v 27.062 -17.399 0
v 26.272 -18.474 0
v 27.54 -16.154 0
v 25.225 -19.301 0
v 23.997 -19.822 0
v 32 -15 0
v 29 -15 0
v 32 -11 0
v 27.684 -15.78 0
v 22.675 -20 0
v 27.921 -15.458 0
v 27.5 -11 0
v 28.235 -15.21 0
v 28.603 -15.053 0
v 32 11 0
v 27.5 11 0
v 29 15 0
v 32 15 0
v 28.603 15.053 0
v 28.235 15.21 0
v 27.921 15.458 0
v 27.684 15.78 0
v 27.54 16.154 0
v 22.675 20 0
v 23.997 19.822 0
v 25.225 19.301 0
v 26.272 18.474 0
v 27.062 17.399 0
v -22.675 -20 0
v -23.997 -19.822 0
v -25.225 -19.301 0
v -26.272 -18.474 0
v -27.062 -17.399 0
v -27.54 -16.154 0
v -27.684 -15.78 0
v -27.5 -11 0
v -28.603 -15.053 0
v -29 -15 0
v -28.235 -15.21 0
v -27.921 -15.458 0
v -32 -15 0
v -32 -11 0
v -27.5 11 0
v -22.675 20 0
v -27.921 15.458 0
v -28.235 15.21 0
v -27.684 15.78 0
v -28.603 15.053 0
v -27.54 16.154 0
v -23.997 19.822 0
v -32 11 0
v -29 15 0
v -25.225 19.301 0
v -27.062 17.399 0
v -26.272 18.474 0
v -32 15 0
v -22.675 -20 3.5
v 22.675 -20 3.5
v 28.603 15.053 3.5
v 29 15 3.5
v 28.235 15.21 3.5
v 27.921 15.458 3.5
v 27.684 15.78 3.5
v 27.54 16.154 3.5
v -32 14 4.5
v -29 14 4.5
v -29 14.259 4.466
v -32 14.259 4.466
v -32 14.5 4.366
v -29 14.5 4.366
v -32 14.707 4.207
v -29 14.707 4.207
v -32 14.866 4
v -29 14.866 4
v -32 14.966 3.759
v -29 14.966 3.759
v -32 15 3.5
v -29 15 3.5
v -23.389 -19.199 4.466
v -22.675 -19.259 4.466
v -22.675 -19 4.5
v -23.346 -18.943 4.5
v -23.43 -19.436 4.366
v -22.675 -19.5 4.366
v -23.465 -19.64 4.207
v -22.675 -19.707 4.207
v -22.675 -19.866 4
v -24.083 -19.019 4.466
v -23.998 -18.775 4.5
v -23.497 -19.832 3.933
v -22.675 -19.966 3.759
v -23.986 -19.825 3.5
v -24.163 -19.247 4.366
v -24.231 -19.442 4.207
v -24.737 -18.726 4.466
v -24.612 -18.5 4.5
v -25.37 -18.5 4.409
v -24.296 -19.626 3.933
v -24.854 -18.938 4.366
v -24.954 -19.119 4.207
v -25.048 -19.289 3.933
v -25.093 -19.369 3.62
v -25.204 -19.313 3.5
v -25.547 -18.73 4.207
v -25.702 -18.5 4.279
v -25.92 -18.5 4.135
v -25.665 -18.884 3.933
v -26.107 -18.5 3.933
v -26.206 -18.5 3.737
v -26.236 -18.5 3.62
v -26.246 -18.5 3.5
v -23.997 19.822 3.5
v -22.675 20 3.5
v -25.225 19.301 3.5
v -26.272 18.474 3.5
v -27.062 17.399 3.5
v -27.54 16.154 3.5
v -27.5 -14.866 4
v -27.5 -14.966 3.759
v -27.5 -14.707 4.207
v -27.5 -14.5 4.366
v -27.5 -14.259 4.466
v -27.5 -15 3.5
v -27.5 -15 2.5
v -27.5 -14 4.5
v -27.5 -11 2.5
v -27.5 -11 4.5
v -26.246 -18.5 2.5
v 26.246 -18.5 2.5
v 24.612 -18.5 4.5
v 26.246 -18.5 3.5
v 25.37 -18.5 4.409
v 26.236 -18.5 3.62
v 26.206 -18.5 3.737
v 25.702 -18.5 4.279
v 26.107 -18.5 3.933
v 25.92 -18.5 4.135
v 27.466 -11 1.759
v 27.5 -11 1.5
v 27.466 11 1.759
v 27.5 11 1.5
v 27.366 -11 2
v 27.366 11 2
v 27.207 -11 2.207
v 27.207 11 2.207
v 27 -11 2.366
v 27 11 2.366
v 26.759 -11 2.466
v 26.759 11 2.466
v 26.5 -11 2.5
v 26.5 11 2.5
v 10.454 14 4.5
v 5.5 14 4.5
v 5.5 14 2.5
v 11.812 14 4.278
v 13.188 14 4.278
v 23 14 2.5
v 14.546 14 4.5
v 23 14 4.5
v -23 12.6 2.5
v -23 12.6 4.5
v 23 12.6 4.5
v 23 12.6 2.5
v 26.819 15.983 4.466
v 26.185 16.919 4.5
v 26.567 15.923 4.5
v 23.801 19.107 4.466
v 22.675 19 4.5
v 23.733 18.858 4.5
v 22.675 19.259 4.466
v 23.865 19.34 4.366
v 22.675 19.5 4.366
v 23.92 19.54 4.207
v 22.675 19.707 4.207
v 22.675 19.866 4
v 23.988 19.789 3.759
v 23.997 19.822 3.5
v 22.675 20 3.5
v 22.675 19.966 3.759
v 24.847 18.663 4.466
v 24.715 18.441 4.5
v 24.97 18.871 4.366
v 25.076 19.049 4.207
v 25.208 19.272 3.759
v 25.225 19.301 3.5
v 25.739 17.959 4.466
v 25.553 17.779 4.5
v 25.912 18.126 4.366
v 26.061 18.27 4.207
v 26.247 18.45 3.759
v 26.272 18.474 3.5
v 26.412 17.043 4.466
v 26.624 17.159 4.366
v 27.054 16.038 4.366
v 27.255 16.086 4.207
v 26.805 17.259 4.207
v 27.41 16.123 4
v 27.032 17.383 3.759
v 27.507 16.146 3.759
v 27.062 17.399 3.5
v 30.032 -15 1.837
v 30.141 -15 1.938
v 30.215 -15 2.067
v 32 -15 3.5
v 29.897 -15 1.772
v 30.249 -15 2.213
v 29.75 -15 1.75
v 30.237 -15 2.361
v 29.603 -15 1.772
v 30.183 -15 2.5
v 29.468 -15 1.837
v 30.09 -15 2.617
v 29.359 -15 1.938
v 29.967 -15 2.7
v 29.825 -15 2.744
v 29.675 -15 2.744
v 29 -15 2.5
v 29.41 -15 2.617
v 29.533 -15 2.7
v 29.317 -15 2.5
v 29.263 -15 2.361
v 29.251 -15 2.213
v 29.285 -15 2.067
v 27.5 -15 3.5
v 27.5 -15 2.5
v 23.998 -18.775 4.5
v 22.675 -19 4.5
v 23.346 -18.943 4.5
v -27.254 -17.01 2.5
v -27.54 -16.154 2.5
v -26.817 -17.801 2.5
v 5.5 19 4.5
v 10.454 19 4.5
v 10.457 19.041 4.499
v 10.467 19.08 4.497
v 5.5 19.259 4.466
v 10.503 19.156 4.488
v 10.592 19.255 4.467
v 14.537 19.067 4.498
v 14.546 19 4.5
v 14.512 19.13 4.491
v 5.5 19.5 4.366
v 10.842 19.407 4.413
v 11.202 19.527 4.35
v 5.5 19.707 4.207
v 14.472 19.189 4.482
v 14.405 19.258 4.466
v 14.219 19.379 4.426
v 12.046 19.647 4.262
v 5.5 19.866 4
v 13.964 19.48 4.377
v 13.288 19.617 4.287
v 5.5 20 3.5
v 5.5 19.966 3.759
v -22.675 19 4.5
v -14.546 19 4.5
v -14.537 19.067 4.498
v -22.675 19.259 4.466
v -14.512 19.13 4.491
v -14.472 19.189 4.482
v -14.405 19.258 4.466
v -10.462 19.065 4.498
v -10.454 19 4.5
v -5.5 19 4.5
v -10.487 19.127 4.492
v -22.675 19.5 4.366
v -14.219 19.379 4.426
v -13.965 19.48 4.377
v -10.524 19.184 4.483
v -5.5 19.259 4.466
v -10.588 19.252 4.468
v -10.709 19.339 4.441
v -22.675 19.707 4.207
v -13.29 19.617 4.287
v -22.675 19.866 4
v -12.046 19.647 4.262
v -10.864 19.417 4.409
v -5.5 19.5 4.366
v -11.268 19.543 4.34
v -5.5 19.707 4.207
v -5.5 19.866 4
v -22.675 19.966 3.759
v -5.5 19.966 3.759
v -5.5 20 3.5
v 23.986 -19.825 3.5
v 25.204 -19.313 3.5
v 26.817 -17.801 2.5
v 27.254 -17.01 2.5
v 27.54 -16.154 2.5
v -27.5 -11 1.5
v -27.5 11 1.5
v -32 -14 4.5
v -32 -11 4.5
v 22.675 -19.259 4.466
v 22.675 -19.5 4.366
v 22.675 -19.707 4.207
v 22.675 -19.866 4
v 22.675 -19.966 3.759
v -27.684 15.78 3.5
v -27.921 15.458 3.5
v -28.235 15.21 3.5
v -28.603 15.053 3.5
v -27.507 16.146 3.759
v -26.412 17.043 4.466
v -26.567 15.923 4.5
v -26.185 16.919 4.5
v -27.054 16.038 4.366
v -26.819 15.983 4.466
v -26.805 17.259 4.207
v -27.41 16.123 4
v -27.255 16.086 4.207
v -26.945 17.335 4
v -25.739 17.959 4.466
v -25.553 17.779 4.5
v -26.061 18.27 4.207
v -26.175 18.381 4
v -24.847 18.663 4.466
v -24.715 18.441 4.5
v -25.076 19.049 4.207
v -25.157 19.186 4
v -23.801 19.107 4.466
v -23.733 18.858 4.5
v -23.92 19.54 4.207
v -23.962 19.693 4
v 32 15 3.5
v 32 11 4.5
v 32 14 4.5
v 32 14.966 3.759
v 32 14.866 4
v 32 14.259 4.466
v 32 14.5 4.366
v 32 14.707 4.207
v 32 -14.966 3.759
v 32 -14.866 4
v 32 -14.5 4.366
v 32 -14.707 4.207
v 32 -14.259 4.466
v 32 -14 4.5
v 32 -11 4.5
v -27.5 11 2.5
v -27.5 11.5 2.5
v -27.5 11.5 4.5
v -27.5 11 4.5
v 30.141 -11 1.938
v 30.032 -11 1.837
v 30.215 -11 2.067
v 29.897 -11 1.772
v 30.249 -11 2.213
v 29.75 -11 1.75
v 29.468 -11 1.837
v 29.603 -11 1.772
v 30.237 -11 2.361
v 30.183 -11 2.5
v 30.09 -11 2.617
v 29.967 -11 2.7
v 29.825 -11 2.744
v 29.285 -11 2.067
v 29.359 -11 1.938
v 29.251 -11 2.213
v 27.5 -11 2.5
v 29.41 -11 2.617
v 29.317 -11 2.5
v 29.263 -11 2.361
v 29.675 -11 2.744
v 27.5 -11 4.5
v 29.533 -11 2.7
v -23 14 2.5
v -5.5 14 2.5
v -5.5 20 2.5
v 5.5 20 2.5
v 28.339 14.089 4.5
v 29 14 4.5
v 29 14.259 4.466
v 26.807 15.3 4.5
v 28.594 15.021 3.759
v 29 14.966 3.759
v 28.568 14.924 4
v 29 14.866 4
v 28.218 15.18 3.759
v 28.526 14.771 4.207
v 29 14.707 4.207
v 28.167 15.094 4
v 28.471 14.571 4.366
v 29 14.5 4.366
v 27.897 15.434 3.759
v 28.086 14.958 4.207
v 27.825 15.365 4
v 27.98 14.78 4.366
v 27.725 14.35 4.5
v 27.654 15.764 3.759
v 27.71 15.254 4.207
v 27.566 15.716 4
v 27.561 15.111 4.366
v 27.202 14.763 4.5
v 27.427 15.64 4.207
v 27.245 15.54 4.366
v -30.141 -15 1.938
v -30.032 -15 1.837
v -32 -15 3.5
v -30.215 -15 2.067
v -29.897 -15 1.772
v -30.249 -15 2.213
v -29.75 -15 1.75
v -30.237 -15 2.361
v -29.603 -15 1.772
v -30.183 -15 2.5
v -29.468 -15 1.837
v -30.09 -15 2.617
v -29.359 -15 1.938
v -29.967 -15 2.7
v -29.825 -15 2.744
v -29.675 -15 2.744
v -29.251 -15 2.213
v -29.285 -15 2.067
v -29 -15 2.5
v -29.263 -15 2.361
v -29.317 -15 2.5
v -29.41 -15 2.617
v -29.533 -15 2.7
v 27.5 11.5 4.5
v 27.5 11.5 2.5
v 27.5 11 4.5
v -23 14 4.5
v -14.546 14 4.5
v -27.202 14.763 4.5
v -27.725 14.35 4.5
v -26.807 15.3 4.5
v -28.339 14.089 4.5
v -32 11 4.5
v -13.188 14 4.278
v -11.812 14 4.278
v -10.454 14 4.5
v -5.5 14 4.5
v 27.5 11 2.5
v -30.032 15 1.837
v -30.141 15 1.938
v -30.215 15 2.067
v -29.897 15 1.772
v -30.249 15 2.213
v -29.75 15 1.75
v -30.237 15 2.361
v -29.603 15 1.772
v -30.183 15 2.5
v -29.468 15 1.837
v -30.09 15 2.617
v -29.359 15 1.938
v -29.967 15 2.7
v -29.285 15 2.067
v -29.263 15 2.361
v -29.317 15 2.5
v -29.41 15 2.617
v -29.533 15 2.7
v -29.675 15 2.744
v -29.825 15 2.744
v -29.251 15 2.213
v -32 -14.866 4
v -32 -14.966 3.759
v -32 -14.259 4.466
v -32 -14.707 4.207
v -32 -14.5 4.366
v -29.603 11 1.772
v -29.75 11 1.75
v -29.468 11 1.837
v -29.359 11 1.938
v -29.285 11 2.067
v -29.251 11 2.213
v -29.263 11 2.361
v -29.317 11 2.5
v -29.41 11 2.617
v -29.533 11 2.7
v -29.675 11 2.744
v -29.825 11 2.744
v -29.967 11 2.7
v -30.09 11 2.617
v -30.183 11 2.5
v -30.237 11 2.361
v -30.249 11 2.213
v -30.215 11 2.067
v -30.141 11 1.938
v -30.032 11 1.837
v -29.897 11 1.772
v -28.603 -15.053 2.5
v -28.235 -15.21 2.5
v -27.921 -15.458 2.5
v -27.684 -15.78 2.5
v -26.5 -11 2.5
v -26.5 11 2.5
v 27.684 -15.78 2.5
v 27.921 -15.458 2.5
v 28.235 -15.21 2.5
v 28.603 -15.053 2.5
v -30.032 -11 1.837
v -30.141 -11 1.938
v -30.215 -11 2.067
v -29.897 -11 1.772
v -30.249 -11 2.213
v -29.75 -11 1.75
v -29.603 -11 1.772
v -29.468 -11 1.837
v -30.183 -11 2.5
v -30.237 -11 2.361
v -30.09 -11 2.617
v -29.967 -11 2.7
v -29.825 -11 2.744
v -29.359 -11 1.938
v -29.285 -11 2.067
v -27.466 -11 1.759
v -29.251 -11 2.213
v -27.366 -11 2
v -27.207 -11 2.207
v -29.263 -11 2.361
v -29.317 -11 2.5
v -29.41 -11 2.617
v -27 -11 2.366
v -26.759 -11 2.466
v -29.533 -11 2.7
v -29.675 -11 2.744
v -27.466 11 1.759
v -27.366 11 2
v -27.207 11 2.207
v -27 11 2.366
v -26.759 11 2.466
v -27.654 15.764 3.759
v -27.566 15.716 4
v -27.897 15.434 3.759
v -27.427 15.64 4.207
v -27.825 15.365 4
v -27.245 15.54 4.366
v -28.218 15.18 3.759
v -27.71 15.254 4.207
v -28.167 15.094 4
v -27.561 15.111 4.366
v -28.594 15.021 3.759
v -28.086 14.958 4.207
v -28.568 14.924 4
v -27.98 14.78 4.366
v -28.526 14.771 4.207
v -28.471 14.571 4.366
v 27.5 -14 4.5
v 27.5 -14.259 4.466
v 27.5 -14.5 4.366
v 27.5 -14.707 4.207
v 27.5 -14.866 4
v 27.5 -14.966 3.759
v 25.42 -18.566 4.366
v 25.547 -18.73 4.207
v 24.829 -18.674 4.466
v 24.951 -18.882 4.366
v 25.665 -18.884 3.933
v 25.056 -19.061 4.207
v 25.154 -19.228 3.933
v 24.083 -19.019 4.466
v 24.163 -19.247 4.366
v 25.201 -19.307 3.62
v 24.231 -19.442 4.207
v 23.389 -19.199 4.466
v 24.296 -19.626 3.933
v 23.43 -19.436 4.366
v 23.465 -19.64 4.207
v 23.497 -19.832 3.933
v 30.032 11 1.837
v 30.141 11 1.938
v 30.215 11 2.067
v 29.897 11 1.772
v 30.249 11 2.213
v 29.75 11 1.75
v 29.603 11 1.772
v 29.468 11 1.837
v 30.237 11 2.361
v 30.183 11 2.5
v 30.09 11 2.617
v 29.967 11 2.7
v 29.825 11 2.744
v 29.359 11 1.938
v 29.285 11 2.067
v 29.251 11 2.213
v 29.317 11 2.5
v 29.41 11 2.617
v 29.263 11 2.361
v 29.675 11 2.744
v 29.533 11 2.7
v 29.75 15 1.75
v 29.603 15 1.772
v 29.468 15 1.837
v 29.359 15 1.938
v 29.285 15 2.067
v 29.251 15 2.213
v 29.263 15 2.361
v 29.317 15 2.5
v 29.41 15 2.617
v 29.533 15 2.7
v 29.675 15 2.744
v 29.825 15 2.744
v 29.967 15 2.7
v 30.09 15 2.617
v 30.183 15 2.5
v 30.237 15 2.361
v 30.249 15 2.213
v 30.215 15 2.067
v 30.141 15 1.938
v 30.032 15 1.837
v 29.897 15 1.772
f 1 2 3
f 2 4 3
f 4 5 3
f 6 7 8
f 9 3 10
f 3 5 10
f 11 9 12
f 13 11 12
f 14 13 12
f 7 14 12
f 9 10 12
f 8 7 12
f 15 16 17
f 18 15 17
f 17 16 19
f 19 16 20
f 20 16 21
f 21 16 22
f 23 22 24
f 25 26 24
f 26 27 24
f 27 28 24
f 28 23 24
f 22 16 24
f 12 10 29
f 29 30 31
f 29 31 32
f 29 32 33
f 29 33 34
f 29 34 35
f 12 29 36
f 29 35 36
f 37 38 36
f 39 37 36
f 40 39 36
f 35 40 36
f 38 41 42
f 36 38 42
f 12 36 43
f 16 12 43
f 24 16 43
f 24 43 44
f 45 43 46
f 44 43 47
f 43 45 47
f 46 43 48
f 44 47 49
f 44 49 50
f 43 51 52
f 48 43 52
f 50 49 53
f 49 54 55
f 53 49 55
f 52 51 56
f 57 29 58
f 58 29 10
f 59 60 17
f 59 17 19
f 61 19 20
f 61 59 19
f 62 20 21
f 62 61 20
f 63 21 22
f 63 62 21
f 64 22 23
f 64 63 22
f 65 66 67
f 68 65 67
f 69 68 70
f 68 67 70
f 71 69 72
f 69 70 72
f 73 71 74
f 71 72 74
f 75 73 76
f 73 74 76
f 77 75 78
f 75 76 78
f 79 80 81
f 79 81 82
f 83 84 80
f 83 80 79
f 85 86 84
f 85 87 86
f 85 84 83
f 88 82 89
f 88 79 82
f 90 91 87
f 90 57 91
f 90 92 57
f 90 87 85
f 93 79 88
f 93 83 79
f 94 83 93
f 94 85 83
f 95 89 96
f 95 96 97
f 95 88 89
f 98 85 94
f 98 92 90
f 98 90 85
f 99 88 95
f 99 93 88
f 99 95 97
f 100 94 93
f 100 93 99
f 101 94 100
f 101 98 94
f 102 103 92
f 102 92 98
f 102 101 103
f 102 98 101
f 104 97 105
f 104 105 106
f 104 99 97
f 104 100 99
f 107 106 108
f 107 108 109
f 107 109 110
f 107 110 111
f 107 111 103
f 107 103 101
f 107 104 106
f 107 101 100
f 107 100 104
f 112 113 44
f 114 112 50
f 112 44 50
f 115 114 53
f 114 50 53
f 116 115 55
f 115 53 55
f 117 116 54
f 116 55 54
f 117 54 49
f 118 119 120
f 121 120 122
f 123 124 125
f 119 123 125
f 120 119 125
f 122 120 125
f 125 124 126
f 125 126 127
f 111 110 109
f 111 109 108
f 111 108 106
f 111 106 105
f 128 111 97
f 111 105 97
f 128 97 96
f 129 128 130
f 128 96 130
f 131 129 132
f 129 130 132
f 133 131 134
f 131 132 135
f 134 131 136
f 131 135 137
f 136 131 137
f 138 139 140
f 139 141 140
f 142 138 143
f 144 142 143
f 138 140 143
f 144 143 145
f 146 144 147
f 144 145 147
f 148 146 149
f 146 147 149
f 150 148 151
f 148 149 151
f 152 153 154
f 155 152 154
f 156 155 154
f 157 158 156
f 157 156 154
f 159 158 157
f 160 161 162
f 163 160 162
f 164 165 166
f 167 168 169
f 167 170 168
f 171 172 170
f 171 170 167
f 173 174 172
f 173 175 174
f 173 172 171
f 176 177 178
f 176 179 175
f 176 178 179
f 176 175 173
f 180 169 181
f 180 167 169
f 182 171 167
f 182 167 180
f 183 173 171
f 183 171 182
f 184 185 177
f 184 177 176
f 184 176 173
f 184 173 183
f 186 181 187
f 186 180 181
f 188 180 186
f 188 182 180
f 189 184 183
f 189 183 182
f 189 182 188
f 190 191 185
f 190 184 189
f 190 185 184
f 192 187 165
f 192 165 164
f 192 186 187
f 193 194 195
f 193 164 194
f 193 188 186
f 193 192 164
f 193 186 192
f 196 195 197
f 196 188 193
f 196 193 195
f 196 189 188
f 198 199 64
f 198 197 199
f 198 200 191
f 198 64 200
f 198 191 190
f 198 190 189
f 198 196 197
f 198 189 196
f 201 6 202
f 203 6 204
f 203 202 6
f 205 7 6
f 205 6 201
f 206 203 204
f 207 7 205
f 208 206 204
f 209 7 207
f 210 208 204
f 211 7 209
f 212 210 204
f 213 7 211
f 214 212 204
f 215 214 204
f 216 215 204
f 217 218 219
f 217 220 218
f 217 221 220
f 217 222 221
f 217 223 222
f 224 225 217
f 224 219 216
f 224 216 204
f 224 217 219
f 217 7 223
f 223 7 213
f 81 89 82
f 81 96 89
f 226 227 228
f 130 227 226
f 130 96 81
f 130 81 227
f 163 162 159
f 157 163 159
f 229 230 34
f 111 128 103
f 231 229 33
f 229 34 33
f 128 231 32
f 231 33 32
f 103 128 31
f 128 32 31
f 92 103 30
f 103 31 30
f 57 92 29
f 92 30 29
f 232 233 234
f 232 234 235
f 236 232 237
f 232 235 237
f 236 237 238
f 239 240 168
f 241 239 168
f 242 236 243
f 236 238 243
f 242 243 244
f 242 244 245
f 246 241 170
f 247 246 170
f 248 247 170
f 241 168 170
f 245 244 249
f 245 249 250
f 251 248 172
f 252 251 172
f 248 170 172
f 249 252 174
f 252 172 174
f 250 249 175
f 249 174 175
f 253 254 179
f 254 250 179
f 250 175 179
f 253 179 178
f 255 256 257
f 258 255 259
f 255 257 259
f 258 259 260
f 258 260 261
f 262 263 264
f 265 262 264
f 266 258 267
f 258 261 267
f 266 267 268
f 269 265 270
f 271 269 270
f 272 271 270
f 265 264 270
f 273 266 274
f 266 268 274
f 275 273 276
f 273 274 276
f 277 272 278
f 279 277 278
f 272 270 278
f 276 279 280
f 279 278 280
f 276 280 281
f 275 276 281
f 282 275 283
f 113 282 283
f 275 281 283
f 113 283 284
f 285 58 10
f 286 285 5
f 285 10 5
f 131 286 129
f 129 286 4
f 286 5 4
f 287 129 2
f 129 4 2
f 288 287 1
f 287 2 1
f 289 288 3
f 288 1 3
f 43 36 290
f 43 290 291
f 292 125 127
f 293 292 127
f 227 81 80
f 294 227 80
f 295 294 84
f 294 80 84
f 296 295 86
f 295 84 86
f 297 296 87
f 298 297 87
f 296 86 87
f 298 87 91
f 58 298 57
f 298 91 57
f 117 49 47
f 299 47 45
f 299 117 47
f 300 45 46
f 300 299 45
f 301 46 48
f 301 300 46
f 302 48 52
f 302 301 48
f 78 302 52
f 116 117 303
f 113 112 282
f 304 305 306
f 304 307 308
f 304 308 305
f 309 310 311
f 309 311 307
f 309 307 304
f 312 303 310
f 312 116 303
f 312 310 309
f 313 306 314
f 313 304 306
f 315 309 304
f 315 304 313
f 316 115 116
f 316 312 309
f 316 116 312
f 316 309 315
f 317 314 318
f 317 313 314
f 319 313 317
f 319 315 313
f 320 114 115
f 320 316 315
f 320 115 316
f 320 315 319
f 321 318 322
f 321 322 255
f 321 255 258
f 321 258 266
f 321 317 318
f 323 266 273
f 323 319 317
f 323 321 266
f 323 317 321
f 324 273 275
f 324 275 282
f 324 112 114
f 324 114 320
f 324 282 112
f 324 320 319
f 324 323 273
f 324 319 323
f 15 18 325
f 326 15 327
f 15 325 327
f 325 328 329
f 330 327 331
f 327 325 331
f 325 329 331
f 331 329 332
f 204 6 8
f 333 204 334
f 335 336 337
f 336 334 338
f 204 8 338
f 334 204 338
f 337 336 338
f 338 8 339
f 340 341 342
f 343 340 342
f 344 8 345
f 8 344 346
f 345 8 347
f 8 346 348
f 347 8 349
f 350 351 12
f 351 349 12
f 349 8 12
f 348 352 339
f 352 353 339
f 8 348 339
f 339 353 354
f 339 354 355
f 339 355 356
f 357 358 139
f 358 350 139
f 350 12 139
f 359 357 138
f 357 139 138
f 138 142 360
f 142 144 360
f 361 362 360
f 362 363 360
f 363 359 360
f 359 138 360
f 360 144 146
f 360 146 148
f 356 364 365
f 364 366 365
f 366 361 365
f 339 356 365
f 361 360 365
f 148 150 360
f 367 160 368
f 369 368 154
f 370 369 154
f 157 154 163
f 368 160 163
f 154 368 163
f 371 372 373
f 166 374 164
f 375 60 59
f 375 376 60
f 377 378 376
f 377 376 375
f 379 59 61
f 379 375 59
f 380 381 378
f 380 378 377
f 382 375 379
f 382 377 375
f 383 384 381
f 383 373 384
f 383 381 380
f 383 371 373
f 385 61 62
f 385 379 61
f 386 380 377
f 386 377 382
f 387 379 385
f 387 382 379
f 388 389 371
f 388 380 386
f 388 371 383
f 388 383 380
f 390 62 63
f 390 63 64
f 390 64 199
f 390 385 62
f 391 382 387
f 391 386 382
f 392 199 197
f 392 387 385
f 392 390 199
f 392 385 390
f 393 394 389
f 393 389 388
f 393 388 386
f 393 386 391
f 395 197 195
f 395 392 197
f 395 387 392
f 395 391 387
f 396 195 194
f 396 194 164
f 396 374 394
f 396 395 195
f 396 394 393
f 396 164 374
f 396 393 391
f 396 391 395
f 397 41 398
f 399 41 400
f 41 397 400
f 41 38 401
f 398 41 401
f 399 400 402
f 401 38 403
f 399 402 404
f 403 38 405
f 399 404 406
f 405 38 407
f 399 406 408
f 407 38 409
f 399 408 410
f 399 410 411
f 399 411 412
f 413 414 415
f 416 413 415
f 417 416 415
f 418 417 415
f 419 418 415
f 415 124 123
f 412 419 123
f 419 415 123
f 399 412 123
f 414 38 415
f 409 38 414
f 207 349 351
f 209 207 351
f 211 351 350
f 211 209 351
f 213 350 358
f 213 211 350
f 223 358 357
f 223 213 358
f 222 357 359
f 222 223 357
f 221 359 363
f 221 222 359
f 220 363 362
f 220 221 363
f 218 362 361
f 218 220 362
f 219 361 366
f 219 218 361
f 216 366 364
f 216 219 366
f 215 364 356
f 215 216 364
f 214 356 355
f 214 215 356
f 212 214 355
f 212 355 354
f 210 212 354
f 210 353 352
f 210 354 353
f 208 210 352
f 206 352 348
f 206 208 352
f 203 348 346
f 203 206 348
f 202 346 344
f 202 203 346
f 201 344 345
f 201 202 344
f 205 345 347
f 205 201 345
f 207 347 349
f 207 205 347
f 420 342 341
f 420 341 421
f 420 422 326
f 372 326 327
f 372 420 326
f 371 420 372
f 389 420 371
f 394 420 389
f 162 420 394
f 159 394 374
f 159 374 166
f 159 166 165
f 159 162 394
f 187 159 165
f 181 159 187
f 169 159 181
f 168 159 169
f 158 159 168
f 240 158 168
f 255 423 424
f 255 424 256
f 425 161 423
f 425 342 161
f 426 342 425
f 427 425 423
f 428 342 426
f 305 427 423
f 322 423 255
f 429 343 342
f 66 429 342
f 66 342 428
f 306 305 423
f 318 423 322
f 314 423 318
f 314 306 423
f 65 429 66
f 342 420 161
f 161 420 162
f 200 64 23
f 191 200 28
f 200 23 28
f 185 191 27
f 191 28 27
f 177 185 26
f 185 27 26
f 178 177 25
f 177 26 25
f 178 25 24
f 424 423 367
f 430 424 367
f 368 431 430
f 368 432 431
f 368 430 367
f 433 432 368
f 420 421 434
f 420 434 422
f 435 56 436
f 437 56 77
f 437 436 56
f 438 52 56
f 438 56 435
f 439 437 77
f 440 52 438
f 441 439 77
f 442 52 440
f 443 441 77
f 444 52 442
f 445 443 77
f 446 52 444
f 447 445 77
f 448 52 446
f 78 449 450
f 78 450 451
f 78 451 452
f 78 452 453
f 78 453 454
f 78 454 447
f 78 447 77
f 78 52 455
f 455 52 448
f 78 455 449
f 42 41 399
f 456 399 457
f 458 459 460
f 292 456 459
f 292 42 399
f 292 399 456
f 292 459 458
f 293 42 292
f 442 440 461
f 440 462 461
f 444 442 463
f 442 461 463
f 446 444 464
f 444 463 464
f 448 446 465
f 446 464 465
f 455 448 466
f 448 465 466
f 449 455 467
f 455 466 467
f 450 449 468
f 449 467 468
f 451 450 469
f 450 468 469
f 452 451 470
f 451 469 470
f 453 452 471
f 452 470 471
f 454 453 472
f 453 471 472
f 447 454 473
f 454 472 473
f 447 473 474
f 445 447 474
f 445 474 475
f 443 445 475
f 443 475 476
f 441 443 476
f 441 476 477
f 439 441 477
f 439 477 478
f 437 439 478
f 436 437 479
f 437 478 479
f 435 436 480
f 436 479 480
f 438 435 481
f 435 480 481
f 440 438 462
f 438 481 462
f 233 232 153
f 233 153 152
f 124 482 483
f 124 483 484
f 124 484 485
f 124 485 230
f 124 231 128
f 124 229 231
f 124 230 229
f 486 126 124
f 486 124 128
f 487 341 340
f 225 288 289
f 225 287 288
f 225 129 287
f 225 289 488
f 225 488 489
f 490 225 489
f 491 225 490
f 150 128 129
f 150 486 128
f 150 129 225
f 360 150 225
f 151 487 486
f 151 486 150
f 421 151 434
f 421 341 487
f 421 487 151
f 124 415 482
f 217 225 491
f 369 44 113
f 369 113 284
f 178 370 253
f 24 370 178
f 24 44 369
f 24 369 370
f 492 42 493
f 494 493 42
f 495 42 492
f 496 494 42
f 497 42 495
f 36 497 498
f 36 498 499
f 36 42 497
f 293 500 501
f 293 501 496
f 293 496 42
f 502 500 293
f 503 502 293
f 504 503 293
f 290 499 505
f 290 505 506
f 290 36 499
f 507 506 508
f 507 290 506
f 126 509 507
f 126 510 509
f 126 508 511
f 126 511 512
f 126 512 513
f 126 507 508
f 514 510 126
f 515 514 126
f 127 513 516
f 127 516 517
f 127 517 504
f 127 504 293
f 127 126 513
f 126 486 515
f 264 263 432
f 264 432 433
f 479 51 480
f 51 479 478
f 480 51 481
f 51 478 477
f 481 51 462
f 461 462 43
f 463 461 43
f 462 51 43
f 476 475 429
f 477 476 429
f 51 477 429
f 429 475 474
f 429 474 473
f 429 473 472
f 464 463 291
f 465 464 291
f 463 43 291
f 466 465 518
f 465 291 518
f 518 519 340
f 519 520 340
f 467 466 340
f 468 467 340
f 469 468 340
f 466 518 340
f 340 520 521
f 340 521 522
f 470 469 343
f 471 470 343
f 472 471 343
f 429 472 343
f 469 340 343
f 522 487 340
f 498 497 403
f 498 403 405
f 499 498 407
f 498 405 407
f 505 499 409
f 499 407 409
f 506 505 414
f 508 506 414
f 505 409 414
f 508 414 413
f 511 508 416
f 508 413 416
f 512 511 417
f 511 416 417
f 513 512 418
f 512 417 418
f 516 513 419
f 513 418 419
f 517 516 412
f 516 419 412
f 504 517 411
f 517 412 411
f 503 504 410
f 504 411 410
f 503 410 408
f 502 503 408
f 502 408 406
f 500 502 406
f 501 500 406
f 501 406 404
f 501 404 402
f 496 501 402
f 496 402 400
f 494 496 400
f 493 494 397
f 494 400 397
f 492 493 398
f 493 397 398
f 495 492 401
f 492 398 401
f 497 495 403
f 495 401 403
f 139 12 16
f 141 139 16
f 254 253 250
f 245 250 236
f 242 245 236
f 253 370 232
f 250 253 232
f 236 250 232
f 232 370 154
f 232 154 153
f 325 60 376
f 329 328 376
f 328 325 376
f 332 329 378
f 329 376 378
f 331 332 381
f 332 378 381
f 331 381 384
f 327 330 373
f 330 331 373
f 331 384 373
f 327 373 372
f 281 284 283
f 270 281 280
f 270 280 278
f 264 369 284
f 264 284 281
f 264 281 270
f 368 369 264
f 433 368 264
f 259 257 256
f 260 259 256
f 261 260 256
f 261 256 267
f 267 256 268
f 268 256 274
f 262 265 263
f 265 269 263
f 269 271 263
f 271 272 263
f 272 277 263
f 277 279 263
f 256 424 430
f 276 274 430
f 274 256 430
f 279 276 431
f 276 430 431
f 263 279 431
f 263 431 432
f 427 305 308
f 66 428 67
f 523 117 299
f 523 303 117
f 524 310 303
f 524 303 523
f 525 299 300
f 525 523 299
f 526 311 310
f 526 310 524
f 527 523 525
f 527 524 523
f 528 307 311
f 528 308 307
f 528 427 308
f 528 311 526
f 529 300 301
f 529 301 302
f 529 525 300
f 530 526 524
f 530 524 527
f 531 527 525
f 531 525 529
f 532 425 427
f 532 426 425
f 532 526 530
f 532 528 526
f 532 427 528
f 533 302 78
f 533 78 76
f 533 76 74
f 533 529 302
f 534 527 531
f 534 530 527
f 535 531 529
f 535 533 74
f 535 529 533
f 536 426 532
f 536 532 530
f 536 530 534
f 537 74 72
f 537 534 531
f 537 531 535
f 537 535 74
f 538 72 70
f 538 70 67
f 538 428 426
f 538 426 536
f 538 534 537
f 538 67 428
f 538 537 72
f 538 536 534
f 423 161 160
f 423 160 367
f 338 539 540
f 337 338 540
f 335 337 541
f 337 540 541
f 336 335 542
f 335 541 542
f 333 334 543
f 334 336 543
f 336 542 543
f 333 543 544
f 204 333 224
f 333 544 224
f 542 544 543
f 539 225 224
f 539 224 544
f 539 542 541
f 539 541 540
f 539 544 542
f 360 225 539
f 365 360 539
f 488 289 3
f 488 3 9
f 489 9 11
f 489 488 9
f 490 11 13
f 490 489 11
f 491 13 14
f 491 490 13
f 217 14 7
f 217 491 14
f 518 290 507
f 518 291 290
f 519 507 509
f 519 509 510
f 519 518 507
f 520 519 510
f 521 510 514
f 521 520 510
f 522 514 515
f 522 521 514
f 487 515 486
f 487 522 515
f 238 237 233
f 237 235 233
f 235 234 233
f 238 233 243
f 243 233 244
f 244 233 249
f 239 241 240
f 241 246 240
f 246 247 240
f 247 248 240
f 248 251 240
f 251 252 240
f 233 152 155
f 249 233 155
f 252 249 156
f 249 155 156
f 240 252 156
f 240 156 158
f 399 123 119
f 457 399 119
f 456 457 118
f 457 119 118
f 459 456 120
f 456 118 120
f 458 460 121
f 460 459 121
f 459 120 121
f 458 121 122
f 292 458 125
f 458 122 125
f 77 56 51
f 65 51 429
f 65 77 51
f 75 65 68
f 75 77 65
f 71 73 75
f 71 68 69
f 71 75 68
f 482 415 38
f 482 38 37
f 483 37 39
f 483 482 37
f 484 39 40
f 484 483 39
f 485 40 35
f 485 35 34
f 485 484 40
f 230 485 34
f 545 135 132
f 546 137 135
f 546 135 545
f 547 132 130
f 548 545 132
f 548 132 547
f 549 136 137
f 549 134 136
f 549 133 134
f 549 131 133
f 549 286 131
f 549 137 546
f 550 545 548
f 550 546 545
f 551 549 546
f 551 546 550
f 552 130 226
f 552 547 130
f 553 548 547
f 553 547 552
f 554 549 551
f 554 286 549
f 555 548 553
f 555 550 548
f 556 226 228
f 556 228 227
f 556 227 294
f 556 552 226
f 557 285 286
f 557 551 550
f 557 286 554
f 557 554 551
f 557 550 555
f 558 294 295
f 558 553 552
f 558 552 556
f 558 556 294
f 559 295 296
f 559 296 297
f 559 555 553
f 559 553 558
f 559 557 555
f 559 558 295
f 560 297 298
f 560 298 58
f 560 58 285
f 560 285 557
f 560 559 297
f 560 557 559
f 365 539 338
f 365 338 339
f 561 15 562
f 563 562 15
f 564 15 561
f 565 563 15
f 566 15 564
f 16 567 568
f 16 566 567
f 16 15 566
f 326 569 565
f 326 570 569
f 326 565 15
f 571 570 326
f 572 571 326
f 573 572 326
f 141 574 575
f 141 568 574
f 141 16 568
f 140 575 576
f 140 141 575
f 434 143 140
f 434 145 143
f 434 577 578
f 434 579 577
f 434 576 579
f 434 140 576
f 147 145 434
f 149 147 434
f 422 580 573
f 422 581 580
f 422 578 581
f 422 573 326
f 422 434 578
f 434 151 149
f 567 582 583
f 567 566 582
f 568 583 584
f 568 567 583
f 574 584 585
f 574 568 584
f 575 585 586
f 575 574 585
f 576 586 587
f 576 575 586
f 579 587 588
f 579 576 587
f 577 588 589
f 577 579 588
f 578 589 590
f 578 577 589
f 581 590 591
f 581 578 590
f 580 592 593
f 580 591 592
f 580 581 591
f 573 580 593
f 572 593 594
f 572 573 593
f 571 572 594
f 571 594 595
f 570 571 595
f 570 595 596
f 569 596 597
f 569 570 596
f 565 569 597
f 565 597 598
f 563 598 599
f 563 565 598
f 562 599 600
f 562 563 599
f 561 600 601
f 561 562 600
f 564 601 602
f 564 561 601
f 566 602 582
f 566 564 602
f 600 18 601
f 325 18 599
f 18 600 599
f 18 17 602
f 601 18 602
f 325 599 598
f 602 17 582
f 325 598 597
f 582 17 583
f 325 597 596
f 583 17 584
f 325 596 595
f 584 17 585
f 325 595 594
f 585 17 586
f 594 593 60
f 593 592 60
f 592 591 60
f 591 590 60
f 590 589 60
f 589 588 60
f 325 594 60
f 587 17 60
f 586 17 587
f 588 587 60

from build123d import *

# Parameters (mm, degrees)
SKETCH1_W           = 55
SKETCH1_H           = 40
BOSS_EXTRUDE1_DEPTH = 4.5
SKETCH2_W           = 46
SKETCH2_H           = 1.4
SKETCH2_W_2         = 55
SKETCH2_H_2         = 30
CUT_EXTRUDE1_DEPTH  = 2
CUT_EXTRUDE2_REACH  = 45.96
SKETCH3_R           = 8.5
SKETCH3_W           = 11
SKETCH3_H           = 5
SKETCH4_W           = 4.5
SKETCH4_H           = 4
BOSS_EXTRUDE2_DEPTH = 4.5
SKETCH5_R           = 0.5
CUT_EXTRUDE3_DEPTH  = 45.780017865
FILLET1_R           = 1.5
FILLET2_R           = 5
FILLET3_R           = 1
FILLET4_R           = 1


with BuildPart() as part:
    # Sketch1 → Boss-Extrude1 (new body)
    with BuildSketch(Plane.XY):
        Rectangle(SKETCH1_W, SKETCH1_H)
    extrude(amount=BOSS_EXTRUDE1_DEPTH)

    # Sketch2 → Cut-Extrude1 (cut)
    with BuildSketch(Plane.XY.offset(4.5)):
        with Locations((0, 13.3)):
            Rectangle(SKETCH2_W, SKETCH2_H)
        with Locations((0, -3.5)):
            Rectangle(SKETCH2_W_2, SKETCH2_H_2)
    extrude(amount=-CUT_EXTRUDE1_DEPTH, mode=Mode.SUBTRACT)

    # Sketch3 → Cut-Extrude2 (cut, up to next)
    with BuildSketch(Plane.XZ.offset(-14), mode=Mode.PRIVATE) as cut_extrude2_sk1:
        with Locations((-12.5, 12.75)):
            Circle(SKETCH3_R)
    cut_extrude2_tool1 = extrude(cut_extrude2_sk1.sketch, amount=-CUT_EXTRUDE2_REACH, mode=Mode.PRIVATE) & part.part
    # Sketch3 → Cut-Extrude2 (cut, up to next)
    with BuildSketch(Plane.XZ.offset(-14), mode=Mode.PRIVATE) as cut_extrude2_sk2:
        with Locations((12.5, 12.75)):
            Circle(SKETCH3_R)
    cut_extrude2_tool2 = extrude(cut_extrude2_sk2.sketch, amount=-CUT_EXTRUDE2_REACH, mode=Mode.PRIVATE) & part.part
    # Sketch3 → Cut-Extrude2 (cut, up to next)
    with BuildSketch(Plane.XZ.offset(-14), mode=Mode.PRIVATE) as cut_extrude2_sk3:
        with Locations((0, 5)):
            Rectangle(SKETCH3_W, SKETCH3_H)
    cut_extrude2_tool3 = extrude(cut_extrude2_sk3.sketch, amount=-CUT_EXTRUDE2_REACH, mode=Mode.PRIVATE) & part.part
    add(cut_extrude2_tool1.solids().sort_by_distance((-12.5, 14, 12.75))[0], mode=Mode.SUBTRACT)
    add(cut_extrude2_tool2.solids().sort_by_distance((12.5, 14, 12.75))[0], mode=Mode.SUBTRACT)
    add(cut_extrude2_tool3.solids().sort_by_distance((0, 14, 5))[0], mode=Mode.SUBTRACT)

    # Sketch4 → Boss-Extrude2 (add)
    with BuildSketch(Plane.ZY.offset(27.5)):
        with Locations((2.25, 13)):
            Rectangle(SKETCH4_W, SKETCH4_H)
        with Locations((2.25, -13)):
            Rectangle(SKETCH4_W, SKETCH4_H)
    boss_extrude2 = extrude(amount=BOSS_EXTRUDE2_DEPTH)

    # Sketch5 → Cut-Extrude3 (cut, symmetric)
    with BuildSketch(Plane.XZ.offset(-11)):
        with Locations(Location((-29.75, 2.25, 0), (0, 0, 270))):
            Circle(SKETCH5_R)
    cut_extrude3 = extrude(amount=CUT_EXTRUDE3_DEPTH, both=True, mode=Mode.SUBTRACT)

    # Mirror1: Boss-Extrude2, Cut-Extrude3 across plane
    add(boss_extrude2.mirror(Plane(origin=(0, 0, 0), x_dir=(0, 0, 1), z_dir=(1, 0, 0))))
    add(cut_extrude3.mirror(Plane(origin=(0, 0, 0), x_dir=(0, 0, 1), z_dir=(1, 0, 0))), mode=Mode.SUBTRACT)

    # Fillet1
    fillet1_edges = [part.edges().sort_by_distance(p)[0] for p in [
        (27.5, 15, 2.25),
        (27.5, -15, 1.25),
        (-27.5, 15, 2.25),
        (-27.5, -15, 1.25),
    ]]
    fillet(fillet1_edges, radius=FILLET1_R)

    # Fillet2
    # the kernel refuses this fillet: 5 mm, written as the material it takes off along each edge
    with BuildSketch(Plane(origin=(-27.5, 20, -12.061388301), x_dir=(1, 0, 0), z_dir=(0, 0, 1)), Plane(origin=(27.5, -20, -12.061388301), x_dir=(-1, 0, 0), z_dir=(0, 0, 1))) as fillet2_piece_1:
        with BuildLine():
            CenterArc((4.82455532, -5), FILLET2_R, 90, 76.657636203)
            Line((-0.040487234, -3.846153846), (-0.526991489, -3.730769231))
            ThreePointArc((-0.526991489, -3.730769231), (-0.5, -3.5), (-0.5, 0))
            Line((-0.5, 0), (0, 0.5))
            Line((0, 0.5), (4.82455532, 0.5))
            Line((4.82455532, 0.5), (4.82455532, 0))
        make_face()
    extrude(amount=28.622776602, mode=Mode.SUBTRACT)
    with BuildSketch(Plane(origin=(27.5, 20, -12.061388301), x_dir=(0.010526097592205859, -0.9999445991001099, 0), z_dir=(0, 0, 1)), Plane(origin=(-27.5, -20, -12.061388301), x_dir=(-0.010526097592205859, 0.9999445991001099, 0), z_dir=(0, 0, 1))) as fillet2_piece_2:
        with BuildLine():
            CenterArc((4.948939255, -4.876918524), FILLET2_R, 102.739251693, 76.657636203)
            Line((-0.05078374, -4.824288036), (-0.55075604, -4.819024987))
            Line((-0.55075604, -4.819024987), (-0.4999723, 0.005263049))
            Line((-0.4999723, 0.005263049), (0.005263049, 0.4999723))
            ThreePointArc((0.005263049, 0.4999723), (3.505069146, 0.463130958), (3.736109707, 0.487691852))
            Line((3.736109707, 0.487691852), (3.846366938, 0))
        make_face()
    extrude(amount=28.622776602, mode=Mode.SUBTRACT)

    # Fillet3
    fillet3_edges = [part.edges().sort_by_distance(p)[0] for p in [
        (27.5, 0, 2.5),
        (-27.5, 0, 2.5),
    ]]
    fillet(fillet3_edges, radius=FILLET3_R)

    # Fillet4
    # the kernel refuses this fillet: 1 mm, written as the material it takes off along each edge
    with BuildSketch(Plane(origin=(29, 15, 4.5), x_dir=(0, 0, -1), z_dir=(1, 0, 0))) as fillet4_piece_1:
        with BuildLine():
            CenterArc((FILLET4_R, -FILLET4_R), FILLET4_R, 90, 90)
            Line((0, -FILLET4_R), (0, 0))
            Line((0, 0), (FILLET4_R, 0))
        make_face()
    extrude(amount=5.5, mode=Mode.SUBTRACT)
    with BuildSketch(Plane(origin=(25, -15, 4.5), x_dir=(0, 0, -1), z_dir=(1, 0, 0)), Plane(origin=(-25, -15, 4.5), x_dir=(0, 1, 0), z_dir=(-1, 0, 0))) as fillet4_piece_2:
        with BuildLine():
            CenterArc((FILLET4_R, FILLET4_R), FILLET4_R, 180, 90)
            Line((0, FILLET4_R), (0, 0))
            Line((0, 0), (FILLET4_R, 0))
        make_face()
    extrude(amount=9.5, mode=Mode.SUBTRACT)
    with BuildSketch(Plane(origin=(29, 16.5, 4.5), x_dir=(0, -1, 0), z_dir=(1, 0, 0))) as fillet4_piece_3:
        with BuildLine():
            CenterArc((1.5 + FILLET4_R, FILLET4_R), FILLET4_R, 180, 90)
            Line((1.5 + FILLET4_R, 0), (1.5, 0))
            Line((1.5, 0), (1.5, FILLET4_R))
        make_face()
    revolve(axis=Axis((29, 16.5, 4.5), (0, 0, -1)), revolution_arc=76.657636203, mode=Mode.SUBTRACT)
    with BuildSketch(Plane(origin=(-29, 16.5, 4.5), x_dir=(0.9730085108210323, -0.23076923076926206, 0), z_dir=(0.23076923076926206, 0.9730085108210323, 0))) as fillet4_piece_4:
        with BuildLine():
            CenterArc((1.5 + FILLET4_R, FILLET4_R), FILLET4_R, 180, 90)
            Line((1.5 + FILLET4_R, 0), (1.5, 0))
            Line((1.5, 0), (1.5, FILLET4_R))
        make_face()
    revolve(axis=Axis((-29, 16.5, 4.5), (0, 0, -1)), revolution_arc=76.657636203, mode=Mode.SUBTRACT)
    with BuildSketch(Plane(origin=(22.67544468, 20, 4.5), x_dir=(0, 0, -1), z_dir=(-1, 0, 0)), Plane(origin=(-12.046338193, 20, 4.5), x_dir=(0, 0, -1), z_dir=(-1, 0, 0))) as fillet4_piece_5:
        with BuildLine():
            CenterArc((FILLET4_R, FILLET4_R), FILLET4_R, 180, 90)
            Line((0, FILLET4_R), (0, 0))
            Line((0, 0), (FILLET4_R, 0))
        make_face()
    extrude(amount=10.629106487, mode=Mode.SUBTRACT)
    with BuildSketch(Plane(origin=(22.67544468, 15, 4.5), x_dir=(0, 1, 0), z_dir=(-1, 0, 0))) as fillet4_piece_6:
        with BuildLine():
            CenterArc((5 - FILLET4_R, FILLET4_R), FILLET4_R, 270, 90)
            Line((5 - FILLET4_R, 0), (5, 0))
            Line((5, 0), (5, FILLET4_R))
        make_face()
    revolve(axis=Axis((22.67544468, 15, 4.5), (0, 0, -1)), revolution_arc=76.657636203, mode=Mode.SUBTRACT)
    with BuildSketch(Plane(origin=(-22.67544468, 15, 4.5), x_dir=(-0.9730085108210407, 0.2307692307692272, 0), z_dir=(-0.2307692307692272, -0.9730085108210407, 0))) as fillet4_piece_7:
        with BuildLine():
            CenterArc((5 - FILLET4_R, FILLET4_R), FILLET4_R, 270, 90)
            Line((5 - FILLET4_R, 0), (5, 0))
            Line((5, 0), (5, FILLET4_R))
        make_face()
    revolve(axis=Axis((-22.67544468, 15, 4.5), (0, 0, -1)), revolution_arc=76.657636203, mode=Mode.SUBTRACT)
    with BuildSketch(Plane(origin=(-22.67544468, -20, 4.5), x_dir=(0, 0, -1), z_dir=(1, 0, 0))) as fillet4_piece_8:
        with BuildLine():
            CenterArc((FILLET4_R, FILLET4_R), FILLET4_R, 180, 90)
            Line((0, FILLET4_R), (0, 0))
            Line((0, 0), (FILLET4_R, 0))
        make_face()
    extrude(amount=45.350889359, mode=Mode.SUBTRACT)
    with BuildSketch(Plane(origin=(-22.67544468, -15, 4.5), x_dir=(0, -1, 0), z_dir=(1, 0, 0))) as fillet4_piece_9:
        with BuildLine():
            CenterArc((5 - FILLET4_R, FILLET4_R), FILLET4_R, 270, 90)
            Line((5 - FILLET4_R, 0), (5, 0))
            Line((5, 0), (5, FILLET4_R))
        make_face()
    revolve(axis=Axis((-22.67544468, -15, 4.5), (0, 0, -1)), revolution_arc=74.223835896, mode=Mode.SUBTRACT)
    with BuildSketch(Plane(origin=(22.67544468, -15, 4.5), x_dir=(0.9623311828904709, -0.2718799265054833, 0), z_dir=(0.2718799265054833, 0.9623311828904709, 0))) as fillet4_piece_10:
        with BuildLine():
            CenterArc((5 - FILLET4_R, FILLET4_R), FILLET4_R, 270, 90)
            Line((5 - FILLET4_R, 0), (5, 0))
            Line((5, 0), (5, FILLET4_R))
        make_face()
    revolve(axis=Axis((22.67544468, -15, 4.5), (0, 0, -1)), revolution_arc=74.223835896, mode=Mode.SUBTRACT)
    with BuildSketch(Plane(origin=(12.953661807, 20, 4.5), x_dir=(0, 0, -1), z_dir=(-1, 0, 0)), Plane(origin=(-3, 20, 4.5), x_dir=(0, 0, -1), z_dir=(-1, 0, 0))) as fillet4_piece_11:
        with BuildLine():
            CenterArc((FILLET4_R, FILLET4_R), FILLET4_R, 180, 90)
            Line((0, FILLET4_R), (0, 0))
            Line((0, 0), (FILLET4_R, 0))
        make_face()
    extrude(amount=9.953661807, mode=Mode.SUBTRACT)
    with BuildSketch(Plane(origin=(-29, 15, 4.5), x_dir=(0, 0, -1), z_dir=(-1, 0, 0))) as fillet4_piece_12:
        with BuildLine():
            CenterArc((FILLET4_R, FILLET4_R), FILLET4_R, 180, 90)
            Line((0, FILLET4_R), (0, 0))
            Line((0, 0), (FILLET4_R, 0))
        make_face()
    extrude(amount=5.5, mode=Mode.SUBTRACT)


solid = part.part
